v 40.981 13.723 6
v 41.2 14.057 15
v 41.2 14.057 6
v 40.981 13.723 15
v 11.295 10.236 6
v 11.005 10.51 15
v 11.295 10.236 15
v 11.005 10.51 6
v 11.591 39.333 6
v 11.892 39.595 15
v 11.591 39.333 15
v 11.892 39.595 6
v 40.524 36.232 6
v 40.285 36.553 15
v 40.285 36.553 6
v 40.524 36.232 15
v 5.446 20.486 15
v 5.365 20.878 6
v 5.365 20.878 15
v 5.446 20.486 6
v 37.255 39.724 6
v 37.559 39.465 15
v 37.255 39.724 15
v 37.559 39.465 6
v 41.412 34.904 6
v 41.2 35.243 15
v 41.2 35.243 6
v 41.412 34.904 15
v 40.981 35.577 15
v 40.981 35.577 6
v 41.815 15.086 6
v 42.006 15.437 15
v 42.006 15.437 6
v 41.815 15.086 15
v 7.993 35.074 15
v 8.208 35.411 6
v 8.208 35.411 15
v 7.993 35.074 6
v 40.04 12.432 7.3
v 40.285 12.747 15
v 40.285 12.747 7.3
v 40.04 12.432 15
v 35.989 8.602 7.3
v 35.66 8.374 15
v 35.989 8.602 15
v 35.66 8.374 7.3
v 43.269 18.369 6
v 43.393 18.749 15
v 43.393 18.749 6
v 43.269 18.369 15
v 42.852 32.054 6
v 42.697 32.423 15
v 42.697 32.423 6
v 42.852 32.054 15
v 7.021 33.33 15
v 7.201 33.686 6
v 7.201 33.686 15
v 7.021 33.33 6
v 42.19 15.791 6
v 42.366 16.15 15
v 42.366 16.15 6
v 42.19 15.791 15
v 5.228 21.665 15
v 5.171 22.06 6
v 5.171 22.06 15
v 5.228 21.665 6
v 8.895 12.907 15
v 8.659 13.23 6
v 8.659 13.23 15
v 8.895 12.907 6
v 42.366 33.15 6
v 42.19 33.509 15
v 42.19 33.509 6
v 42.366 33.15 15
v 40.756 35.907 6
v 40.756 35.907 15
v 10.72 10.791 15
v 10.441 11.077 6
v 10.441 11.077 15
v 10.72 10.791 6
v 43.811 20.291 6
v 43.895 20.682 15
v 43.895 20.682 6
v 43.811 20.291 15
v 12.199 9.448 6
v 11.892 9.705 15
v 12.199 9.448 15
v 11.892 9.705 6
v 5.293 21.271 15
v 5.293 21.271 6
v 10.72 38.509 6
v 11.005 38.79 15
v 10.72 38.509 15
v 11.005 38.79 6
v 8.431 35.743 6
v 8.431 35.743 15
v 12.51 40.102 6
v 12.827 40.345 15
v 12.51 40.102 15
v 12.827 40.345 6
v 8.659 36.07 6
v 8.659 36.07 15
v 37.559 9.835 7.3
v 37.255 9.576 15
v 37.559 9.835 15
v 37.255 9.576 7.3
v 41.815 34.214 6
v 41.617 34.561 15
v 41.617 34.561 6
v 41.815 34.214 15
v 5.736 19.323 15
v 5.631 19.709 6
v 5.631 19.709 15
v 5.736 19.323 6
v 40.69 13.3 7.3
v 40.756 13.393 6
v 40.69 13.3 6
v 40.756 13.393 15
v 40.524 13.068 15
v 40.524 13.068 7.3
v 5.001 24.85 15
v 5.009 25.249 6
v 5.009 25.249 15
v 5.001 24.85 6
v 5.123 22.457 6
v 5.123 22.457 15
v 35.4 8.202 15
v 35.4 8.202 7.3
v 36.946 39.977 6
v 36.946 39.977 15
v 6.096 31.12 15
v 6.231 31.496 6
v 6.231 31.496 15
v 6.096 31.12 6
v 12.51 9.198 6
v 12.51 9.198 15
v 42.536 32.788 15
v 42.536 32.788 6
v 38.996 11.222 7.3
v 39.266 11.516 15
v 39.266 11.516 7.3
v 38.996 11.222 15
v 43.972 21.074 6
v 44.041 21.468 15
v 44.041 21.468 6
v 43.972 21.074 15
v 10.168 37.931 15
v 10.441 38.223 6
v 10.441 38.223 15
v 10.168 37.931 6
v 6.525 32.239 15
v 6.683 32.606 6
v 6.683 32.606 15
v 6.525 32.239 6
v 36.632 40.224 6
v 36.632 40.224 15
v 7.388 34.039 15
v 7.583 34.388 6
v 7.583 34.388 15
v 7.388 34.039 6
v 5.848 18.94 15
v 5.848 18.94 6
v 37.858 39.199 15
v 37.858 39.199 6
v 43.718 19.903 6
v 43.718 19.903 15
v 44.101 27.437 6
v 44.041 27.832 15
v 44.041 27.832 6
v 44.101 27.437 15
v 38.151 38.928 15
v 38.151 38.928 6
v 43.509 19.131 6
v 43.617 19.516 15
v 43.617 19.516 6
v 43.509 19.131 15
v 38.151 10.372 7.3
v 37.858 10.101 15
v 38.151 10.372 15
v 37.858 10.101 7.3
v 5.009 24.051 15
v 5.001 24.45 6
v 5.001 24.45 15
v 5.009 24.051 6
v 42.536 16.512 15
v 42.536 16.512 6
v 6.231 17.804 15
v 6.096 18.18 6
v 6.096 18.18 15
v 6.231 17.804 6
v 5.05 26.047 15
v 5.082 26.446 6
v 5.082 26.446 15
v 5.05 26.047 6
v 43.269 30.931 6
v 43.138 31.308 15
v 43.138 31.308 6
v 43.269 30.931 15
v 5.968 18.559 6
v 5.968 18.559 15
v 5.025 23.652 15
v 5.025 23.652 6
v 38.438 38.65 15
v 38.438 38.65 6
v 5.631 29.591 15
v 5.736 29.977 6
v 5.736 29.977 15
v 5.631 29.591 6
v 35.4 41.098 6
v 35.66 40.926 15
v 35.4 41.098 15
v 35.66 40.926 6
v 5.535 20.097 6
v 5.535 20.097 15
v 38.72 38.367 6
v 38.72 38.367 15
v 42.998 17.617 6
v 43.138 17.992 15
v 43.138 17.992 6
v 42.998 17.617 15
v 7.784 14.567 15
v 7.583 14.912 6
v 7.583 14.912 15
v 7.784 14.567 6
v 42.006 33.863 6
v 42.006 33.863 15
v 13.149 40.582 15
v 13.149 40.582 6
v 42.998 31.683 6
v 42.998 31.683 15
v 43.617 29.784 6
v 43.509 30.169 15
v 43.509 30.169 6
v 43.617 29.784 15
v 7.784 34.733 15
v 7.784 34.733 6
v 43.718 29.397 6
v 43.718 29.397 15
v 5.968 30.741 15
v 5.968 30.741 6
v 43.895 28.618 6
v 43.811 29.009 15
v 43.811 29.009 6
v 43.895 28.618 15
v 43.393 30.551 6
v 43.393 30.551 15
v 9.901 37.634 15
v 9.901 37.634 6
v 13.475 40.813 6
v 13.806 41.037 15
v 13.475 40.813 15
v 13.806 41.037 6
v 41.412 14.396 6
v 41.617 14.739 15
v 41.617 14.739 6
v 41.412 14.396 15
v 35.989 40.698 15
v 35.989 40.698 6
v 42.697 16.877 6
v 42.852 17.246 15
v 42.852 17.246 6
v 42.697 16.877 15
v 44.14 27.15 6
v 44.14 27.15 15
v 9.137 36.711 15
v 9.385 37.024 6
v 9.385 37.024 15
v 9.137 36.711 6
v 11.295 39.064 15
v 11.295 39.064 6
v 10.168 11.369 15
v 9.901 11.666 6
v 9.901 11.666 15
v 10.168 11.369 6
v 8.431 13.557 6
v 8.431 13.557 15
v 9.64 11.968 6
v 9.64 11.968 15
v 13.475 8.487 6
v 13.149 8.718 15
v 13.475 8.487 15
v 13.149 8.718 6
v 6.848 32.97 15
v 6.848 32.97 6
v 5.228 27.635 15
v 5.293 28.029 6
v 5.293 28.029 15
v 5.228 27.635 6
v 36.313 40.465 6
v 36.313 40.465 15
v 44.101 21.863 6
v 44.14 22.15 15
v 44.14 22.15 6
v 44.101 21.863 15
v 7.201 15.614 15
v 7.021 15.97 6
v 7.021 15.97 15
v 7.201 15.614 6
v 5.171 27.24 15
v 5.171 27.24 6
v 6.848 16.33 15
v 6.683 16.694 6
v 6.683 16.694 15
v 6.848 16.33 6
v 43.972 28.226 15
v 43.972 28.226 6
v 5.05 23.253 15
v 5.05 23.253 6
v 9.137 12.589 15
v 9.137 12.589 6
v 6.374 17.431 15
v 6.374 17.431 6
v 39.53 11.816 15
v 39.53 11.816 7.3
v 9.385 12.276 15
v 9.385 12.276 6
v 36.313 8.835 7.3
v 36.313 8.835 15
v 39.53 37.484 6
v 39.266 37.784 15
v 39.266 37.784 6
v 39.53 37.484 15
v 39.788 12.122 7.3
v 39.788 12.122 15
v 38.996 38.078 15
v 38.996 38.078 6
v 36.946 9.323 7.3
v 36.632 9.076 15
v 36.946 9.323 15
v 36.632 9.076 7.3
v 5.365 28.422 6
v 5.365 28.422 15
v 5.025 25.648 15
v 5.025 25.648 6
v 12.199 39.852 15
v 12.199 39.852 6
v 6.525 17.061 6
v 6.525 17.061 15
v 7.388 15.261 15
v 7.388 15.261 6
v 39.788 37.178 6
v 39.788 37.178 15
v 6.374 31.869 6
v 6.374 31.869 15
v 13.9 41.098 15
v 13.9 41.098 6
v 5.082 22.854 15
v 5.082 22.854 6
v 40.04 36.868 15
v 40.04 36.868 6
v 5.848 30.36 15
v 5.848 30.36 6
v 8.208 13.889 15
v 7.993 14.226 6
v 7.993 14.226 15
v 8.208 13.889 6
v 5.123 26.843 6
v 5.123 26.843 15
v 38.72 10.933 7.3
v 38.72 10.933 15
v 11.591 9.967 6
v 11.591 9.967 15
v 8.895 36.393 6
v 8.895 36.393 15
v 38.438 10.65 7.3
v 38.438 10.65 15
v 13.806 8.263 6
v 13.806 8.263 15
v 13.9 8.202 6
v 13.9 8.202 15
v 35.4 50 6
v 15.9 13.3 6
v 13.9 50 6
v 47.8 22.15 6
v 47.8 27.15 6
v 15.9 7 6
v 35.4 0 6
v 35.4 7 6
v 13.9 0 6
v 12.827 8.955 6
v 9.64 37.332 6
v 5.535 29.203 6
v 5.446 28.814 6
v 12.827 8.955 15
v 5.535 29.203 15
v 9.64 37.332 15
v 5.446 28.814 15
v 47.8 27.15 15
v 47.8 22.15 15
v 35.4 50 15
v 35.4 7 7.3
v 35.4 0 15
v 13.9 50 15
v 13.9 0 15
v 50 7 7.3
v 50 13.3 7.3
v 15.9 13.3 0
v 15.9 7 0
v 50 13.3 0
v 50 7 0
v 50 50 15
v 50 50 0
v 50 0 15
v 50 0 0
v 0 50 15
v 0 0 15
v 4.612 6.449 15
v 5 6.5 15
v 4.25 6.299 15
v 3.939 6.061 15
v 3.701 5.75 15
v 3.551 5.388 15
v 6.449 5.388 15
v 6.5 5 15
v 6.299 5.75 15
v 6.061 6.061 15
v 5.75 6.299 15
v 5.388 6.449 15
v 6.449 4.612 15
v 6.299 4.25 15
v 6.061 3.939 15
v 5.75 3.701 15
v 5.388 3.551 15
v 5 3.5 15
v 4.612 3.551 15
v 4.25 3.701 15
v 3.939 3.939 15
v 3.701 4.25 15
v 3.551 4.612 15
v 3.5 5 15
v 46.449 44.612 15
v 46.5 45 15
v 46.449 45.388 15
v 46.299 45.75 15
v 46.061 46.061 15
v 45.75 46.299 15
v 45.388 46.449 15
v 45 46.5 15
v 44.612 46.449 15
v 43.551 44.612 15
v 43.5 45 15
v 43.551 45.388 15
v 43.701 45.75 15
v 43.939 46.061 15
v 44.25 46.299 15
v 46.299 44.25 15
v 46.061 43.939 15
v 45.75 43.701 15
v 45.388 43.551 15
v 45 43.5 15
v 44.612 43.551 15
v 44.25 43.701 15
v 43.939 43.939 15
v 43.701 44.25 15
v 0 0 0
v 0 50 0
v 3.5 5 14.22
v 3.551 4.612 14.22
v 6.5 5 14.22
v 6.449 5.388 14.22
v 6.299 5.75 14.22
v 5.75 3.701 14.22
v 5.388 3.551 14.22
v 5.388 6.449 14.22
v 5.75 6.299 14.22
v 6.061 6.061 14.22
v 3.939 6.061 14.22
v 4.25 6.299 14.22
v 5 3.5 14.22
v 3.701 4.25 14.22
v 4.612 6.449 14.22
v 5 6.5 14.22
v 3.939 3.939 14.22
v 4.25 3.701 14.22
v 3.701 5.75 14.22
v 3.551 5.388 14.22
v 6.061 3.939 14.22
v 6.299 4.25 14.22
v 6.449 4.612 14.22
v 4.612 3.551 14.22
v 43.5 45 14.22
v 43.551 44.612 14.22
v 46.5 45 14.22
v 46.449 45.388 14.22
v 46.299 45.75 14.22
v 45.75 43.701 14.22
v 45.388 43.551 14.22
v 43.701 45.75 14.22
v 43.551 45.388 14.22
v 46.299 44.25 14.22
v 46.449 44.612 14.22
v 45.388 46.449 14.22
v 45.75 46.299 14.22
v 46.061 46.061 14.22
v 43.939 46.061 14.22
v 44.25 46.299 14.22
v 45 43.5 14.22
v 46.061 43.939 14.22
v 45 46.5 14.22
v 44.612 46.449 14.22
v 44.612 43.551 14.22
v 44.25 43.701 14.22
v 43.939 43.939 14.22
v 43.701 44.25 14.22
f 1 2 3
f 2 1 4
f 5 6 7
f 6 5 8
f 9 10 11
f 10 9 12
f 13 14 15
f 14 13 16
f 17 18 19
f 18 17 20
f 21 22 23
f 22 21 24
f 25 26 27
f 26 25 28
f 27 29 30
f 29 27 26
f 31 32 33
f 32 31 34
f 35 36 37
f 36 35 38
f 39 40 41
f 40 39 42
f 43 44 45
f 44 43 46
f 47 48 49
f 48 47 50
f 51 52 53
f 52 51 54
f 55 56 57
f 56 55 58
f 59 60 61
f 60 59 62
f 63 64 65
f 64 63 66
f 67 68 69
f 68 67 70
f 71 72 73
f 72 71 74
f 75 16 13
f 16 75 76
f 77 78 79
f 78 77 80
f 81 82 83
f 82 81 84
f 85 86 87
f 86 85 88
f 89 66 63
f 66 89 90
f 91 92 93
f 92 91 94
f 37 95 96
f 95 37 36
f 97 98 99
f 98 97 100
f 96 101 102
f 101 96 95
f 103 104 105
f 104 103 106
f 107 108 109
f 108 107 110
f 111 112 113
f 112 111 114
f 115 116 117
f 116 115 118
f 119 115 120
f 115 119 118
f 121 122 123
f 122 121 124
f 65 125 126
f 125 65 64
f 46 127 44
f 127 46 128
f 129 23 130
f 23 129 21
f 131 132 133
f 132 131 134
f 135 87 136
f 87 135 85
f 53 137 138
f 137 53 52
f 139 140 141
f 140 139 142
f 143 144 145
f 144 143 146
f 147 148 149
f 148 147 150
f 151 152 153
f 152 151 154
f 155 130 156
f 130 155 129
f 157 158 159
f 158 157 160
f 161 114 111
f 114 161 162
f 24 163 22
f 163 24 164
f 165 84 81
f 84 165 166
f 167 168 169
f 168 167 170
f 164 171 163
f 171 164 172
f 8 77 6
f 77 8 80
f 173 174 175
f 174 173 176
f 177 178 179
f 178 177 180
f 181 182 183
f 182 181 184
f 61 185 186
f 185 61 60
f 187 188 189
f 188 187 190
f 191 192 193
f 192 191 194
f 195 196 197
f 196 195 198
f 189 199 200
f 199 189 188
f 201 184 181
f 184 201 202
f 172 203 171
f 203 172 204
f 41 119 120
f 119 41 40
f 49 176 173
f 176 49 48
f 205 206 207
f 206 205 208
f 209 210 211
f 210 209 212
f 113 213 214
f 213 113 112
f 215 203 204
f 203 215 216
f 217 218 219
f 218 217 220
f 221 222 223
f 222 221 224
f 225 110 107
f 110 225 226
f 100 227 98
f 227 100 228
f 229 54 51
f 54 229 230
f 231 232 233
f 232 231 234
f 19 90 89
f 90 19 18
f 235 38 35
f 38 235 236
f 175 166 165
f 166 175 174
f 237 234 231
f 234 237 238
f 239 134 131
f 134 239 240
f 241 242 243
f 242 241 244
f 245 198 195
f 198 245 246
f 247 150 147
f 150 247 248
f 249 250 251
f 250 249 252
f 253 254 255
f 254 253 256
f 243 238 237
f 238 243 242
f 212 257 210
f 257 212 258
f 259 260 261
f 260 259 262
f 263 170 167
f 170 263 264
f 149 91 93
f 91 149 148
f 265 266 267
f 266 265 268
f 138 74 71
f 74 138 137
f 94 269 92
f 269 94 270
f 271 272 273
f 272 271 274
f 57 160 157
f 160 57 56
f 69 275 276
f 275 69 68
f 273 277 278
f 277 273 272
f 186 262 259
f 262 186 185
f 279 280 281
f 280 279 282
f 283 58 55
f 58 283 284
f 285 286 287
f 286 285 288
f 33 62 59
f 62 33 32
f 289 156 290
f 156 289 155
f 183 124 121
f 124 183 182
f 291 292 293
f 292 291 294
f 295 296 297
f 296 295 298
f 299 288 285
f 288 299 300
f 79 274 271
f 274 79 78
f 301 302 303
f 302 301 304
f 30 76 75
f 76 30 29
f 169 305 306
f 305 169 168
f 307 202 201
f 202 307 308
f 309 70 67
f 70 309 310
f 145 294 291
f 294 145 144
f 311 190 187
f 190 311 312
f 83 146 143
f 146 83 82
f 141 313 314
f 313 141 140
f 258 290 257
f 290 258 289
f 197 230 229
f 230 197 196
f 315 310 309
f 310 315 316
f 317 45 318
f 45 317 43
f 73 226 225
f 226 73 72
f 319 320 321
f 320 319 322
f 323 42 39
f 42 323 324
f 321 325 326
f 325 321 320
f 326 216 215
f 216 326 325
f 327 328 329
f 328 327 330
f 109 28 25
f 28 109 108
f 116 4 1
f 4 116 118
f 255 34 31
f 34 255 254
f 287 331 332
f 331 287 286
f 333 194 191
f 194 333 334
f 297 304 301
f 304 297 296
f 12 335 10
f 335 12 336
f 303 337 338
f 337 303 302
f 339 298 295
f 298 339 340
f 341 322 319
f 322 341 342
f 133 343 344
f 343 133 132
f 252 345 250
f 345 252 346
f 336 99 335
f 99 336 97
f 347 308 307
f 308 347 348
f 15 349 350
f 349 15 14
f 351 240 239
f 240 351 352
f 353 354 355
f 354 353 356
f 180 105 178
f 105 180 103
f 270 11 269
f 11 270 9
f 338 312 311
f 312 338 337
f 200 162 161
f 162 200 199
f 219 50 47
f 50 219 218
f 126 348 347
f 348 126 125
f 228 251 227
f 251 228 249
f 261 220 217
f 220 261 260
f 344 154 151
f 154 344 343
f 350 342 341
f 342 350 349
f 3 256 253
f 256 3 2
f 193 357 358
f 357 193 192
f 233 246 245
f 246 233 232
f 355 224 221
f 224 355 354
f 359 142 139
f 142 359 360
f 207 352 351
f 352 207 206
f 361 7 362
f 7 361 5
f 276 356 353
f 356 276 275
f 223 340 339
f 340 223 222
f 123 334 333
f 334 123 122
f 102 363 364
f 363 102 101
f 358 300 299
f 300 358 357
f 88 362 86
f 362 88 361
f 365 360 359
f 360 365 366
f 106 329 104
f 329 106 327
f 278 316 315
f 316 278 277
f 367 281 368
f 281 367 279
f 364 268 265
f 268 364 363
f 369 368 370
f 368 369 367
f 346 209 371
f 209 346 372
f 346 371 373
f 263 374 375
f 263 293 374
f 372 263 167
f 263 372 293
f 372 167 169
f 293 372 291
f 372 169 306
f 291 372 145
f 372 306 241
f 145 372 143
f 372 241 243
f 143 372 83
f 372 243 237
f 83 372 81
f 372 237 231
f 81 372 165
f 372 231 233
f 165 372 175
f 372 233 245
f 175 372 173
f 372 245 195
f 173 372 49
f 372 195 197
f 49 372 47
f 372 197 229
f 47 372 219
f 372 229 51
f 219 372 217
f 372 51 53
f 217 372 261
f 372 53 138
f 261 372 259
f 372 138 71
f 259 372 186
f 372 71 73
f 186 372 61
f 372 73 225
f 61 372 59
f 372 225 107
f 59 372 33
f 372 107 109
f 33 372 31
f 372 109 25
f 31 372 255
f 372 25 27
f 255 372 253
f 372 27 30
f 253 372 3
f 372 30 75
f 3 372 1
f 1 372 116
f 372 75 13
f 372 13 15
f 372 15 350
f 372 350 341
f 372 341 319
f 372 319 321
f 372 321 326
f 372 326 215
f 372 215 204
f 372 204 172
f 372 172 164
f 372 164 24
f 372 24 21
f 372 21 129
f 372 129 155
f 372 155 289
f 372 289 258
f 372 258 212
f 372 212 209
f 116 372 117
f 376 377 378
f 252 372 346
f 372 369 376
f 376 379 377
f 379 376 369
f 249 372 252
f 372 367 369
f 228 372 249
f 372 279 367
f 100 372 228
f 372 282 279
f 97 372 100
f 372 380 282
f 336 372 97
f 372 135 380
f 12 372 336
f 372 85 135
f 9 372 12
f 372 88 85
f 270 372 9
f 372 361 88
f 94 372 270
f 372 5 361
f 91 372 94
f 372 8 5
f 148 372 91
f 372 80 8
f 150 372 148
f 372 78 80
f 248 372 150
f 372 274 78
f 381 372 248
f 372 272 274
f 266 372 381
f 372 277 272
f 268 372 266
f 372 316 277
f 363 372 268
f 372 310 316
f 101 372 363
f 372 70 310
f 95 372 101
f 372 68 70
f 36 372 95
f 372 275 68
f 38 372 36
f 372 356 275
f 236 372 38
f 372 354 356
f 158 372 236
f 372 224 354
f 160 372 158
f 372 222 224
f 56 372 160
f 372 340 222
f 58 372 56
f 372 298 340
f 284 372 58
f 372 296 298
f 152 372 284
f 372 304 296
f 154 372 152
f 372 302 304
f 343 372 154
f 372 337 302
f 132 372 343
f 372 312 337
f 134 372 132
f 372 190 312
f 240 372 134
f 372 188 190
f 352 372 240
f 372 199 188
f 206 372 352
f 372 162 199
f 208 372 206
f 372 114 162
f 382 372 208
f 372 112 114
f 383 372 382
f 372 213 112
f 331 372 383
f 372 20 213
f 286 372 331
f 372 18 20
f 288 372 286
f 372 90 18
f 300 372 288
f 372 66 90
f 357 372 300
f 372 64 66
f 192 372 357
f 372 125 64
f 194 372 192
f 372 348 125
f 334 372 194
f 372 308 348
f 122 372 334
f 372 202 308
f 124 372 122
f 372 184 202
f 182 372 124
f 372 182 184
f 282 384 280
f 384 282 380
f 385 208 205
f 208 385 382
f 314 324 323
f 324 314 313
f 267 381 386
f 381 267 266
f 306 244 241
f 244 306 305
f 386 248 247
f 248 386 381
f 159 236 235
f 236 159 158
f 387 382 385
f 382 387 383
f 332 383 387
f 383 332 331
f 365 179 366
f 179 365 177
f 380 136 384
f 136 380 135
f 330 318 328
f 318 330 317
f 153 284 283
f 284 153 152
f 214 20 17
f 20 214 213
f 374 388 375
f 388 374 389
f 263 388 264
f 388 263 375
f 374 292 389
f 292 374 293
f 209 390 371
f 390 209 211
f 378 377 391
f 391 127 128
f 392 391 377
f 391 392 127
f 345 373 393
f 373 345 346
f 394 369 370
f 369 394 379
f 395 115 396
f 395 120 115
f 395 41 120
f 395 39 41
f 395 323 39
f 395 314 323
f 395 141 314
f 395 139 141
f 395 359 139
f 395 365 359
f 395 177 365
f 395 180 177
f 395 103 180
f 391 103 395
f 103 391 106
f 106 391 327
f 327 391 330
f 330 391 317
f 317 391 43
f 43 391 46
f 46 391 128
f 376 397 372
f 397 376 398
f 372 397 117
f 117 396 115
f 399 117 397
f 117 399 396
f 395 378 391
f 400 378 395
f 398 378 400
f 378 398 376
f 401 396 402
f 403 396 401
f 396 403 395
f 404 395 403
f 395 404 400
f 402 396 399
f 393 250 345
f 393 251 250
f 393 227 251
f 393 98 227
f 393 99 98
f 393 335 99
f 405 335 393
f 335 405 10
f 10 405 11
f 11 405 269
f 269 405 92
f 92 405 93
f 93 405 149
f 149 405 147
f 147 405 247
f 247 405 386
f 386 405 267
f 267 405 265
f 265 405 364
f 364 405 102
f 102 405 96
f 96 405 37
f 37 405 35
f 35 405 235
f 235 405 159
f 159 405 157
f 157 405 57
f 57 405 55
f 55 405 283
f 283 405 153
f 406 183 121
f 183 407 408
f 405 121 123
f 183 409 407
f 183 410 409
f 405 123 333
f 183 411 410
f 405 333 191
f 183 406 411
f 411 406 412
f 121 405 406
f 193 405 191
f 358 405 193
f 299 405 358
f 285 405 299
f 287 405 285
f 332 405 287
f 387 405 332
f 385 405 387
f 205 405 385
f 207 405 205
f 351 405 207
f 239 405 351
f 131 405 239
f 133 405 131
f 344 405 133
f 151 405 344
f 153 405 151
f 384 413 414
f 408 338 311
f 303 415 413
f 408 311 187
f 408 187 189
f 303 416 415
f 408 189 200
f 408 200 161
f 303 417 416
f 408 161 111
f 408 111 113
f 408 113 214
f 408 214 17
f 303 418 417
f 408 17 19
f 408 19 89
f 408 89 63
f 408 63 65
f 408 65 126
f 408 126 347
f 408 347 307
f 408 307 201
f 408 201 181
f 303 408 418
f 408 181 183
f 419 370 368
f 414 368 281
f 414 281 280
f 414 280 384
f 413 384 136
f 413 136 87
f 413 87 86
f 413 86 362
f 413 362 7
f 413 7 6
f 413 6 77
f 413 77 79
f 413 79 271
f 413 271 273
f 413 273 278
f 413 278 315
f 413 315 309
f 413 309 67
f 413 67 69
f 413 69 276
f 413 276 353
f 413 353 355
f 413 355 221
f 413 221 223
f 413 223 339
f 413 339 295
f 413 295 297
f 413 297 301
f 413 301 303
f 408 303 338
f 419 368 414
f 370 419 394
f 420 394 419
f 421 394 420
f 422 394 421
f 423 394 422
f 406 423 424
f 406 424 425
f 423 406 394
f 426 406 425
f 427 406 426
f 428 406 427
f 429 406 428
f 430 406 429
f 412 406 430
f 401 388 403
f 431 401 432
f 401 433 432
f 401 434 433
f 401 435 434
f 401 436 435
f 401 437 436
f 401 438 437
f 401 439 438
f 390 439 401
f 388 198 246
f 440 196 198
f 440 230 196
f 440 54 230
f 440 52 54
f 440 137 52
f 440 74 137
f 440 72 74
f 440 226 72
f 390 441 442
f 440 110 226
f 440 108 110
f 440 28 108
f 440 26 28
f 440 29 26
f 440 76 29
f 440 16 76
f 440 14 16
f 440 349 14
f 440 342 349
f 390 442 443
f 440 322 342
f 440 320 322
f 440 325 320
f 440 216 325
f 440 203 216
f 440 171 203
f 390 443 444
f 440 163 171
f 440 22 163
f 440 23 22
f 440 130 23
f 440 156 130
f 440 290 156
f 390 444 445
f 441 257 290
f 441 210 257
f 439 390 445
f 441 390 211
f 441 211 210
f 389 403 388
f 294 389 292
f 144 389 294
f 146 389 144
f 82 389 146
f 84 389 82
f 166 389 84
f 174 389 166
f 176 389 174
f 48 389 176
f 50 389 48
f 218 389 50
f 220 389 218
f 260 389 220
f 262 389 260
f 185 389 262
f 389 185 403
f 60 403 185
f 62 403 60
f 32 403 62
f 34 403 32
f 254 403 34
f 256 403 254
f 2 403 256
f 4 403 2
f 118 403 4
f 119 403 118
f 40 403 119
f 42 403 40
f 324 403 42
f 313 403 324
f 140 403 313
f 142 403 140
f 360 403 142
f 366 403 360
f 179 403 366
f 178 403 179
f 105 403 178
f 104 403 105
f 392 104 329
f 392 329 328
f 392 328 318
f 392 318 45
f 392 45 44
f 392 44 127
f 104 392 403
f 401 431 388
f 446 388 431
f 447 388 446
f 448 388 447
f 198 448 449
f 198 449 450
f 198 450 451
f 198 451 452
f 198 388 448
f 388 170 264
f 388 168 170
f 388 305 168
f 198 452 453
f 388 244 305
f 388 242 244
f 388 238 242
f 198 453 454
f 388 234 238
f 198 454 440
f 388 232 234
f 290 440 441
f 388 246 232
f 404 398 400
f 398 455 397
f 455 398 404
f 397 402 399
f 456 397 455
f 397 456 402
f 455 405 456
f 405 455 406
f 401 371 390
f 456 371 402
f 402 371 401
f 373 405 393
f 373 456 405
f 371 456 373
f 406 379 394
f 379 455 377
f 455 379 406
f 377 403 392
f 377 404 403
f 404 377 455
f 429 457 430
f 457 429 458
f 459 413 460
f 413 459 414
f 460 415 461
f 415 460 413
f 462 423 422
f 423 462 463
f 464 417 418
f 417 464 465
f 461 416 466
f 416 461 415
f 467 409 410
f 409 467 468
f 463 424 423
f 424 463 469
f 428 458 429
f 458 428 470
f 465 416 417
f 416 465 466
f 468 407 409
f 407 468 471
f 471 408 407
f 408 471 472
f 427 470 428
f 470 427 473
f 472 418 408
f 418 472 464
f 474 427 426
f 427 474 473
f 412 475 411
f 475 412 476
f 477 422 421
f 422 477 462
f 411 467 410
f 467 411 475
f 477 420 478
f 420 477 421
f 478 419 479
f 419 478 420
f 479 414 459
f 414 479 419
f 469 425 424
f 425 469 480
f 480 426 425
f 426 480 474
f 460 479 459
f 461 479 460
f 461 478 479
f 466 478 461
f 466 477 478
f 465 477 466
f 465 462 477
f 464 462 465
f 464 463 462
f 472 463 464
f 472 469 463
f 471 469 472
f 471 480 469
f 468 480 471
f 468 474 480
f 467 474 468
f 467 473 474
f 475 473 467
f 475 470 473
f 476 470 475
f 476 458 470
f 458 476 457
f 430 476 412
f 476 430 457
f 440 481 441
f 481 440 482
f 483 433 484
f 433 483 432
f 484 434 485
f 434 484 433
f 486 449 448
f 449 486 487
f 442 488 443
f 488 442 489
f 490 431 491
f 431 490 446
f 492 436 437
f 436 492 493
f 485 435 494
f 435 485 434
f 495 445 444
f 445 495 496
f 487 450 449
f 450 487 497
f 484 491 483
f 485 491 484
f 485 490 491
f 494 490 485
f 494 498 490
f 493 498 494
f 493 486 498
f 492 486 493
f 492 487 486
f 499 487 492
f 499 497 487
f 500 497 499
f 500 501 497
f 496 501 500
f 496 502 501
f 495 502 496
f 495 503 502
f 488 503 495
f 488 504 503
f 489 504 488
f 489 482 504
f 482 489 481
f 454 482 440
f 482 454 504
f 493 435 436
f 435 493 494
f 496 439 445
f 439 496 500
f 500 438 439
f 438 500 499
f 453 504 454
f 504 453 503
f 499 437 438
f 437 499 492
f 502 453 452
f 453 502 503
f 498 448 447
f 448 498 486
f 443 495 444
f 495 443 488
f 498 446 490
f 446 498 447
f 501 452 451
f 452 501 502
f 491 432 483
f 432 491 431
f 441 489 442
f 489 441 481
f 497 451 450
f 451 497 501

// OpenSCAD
// file: smartwatch_charger.scad
clock_diameter = 39.3;
clock_radius = clock_diameter/2;
clock_thickness = 10.5;

module clock() {

    // Clock body
    translate([clock_radius, clock_radius, 0]) {
        cylinder(r=clock_radius, h=clock_thickness);
    }

    // Clock rulette
    translate([clock_diameter - 0.5, clock_radius - 2.5, 0]) {
        cube(size=[4, 5, clock_thickness]);
    }

    // Clock supports
    translate([clock_radius - 21.5/2, -15, 0])
        cube([21.5, 65, clock_thickness]);

    // Clock charger hole
    translate([clock_radius - 17.5 / 2, 2, -8 + 1.3])
        cube([40, 6.3, 8]);
    
}
// main file
include <smartwatch_charger.scad>

$fa = 1;
$fs = 0.4;

difference() {
    // Charger base
    cube([50, 50, 15]);

    translate([5, 5, 6])
        clock();

    // Magnets
    translate([5, 5, 15 - 0.78])
        cylinder(r=1.5, h=0.8);

    translate([45, 45, 15 - 0.78])
        cylinder(r=1.5, h=0.8);
}
